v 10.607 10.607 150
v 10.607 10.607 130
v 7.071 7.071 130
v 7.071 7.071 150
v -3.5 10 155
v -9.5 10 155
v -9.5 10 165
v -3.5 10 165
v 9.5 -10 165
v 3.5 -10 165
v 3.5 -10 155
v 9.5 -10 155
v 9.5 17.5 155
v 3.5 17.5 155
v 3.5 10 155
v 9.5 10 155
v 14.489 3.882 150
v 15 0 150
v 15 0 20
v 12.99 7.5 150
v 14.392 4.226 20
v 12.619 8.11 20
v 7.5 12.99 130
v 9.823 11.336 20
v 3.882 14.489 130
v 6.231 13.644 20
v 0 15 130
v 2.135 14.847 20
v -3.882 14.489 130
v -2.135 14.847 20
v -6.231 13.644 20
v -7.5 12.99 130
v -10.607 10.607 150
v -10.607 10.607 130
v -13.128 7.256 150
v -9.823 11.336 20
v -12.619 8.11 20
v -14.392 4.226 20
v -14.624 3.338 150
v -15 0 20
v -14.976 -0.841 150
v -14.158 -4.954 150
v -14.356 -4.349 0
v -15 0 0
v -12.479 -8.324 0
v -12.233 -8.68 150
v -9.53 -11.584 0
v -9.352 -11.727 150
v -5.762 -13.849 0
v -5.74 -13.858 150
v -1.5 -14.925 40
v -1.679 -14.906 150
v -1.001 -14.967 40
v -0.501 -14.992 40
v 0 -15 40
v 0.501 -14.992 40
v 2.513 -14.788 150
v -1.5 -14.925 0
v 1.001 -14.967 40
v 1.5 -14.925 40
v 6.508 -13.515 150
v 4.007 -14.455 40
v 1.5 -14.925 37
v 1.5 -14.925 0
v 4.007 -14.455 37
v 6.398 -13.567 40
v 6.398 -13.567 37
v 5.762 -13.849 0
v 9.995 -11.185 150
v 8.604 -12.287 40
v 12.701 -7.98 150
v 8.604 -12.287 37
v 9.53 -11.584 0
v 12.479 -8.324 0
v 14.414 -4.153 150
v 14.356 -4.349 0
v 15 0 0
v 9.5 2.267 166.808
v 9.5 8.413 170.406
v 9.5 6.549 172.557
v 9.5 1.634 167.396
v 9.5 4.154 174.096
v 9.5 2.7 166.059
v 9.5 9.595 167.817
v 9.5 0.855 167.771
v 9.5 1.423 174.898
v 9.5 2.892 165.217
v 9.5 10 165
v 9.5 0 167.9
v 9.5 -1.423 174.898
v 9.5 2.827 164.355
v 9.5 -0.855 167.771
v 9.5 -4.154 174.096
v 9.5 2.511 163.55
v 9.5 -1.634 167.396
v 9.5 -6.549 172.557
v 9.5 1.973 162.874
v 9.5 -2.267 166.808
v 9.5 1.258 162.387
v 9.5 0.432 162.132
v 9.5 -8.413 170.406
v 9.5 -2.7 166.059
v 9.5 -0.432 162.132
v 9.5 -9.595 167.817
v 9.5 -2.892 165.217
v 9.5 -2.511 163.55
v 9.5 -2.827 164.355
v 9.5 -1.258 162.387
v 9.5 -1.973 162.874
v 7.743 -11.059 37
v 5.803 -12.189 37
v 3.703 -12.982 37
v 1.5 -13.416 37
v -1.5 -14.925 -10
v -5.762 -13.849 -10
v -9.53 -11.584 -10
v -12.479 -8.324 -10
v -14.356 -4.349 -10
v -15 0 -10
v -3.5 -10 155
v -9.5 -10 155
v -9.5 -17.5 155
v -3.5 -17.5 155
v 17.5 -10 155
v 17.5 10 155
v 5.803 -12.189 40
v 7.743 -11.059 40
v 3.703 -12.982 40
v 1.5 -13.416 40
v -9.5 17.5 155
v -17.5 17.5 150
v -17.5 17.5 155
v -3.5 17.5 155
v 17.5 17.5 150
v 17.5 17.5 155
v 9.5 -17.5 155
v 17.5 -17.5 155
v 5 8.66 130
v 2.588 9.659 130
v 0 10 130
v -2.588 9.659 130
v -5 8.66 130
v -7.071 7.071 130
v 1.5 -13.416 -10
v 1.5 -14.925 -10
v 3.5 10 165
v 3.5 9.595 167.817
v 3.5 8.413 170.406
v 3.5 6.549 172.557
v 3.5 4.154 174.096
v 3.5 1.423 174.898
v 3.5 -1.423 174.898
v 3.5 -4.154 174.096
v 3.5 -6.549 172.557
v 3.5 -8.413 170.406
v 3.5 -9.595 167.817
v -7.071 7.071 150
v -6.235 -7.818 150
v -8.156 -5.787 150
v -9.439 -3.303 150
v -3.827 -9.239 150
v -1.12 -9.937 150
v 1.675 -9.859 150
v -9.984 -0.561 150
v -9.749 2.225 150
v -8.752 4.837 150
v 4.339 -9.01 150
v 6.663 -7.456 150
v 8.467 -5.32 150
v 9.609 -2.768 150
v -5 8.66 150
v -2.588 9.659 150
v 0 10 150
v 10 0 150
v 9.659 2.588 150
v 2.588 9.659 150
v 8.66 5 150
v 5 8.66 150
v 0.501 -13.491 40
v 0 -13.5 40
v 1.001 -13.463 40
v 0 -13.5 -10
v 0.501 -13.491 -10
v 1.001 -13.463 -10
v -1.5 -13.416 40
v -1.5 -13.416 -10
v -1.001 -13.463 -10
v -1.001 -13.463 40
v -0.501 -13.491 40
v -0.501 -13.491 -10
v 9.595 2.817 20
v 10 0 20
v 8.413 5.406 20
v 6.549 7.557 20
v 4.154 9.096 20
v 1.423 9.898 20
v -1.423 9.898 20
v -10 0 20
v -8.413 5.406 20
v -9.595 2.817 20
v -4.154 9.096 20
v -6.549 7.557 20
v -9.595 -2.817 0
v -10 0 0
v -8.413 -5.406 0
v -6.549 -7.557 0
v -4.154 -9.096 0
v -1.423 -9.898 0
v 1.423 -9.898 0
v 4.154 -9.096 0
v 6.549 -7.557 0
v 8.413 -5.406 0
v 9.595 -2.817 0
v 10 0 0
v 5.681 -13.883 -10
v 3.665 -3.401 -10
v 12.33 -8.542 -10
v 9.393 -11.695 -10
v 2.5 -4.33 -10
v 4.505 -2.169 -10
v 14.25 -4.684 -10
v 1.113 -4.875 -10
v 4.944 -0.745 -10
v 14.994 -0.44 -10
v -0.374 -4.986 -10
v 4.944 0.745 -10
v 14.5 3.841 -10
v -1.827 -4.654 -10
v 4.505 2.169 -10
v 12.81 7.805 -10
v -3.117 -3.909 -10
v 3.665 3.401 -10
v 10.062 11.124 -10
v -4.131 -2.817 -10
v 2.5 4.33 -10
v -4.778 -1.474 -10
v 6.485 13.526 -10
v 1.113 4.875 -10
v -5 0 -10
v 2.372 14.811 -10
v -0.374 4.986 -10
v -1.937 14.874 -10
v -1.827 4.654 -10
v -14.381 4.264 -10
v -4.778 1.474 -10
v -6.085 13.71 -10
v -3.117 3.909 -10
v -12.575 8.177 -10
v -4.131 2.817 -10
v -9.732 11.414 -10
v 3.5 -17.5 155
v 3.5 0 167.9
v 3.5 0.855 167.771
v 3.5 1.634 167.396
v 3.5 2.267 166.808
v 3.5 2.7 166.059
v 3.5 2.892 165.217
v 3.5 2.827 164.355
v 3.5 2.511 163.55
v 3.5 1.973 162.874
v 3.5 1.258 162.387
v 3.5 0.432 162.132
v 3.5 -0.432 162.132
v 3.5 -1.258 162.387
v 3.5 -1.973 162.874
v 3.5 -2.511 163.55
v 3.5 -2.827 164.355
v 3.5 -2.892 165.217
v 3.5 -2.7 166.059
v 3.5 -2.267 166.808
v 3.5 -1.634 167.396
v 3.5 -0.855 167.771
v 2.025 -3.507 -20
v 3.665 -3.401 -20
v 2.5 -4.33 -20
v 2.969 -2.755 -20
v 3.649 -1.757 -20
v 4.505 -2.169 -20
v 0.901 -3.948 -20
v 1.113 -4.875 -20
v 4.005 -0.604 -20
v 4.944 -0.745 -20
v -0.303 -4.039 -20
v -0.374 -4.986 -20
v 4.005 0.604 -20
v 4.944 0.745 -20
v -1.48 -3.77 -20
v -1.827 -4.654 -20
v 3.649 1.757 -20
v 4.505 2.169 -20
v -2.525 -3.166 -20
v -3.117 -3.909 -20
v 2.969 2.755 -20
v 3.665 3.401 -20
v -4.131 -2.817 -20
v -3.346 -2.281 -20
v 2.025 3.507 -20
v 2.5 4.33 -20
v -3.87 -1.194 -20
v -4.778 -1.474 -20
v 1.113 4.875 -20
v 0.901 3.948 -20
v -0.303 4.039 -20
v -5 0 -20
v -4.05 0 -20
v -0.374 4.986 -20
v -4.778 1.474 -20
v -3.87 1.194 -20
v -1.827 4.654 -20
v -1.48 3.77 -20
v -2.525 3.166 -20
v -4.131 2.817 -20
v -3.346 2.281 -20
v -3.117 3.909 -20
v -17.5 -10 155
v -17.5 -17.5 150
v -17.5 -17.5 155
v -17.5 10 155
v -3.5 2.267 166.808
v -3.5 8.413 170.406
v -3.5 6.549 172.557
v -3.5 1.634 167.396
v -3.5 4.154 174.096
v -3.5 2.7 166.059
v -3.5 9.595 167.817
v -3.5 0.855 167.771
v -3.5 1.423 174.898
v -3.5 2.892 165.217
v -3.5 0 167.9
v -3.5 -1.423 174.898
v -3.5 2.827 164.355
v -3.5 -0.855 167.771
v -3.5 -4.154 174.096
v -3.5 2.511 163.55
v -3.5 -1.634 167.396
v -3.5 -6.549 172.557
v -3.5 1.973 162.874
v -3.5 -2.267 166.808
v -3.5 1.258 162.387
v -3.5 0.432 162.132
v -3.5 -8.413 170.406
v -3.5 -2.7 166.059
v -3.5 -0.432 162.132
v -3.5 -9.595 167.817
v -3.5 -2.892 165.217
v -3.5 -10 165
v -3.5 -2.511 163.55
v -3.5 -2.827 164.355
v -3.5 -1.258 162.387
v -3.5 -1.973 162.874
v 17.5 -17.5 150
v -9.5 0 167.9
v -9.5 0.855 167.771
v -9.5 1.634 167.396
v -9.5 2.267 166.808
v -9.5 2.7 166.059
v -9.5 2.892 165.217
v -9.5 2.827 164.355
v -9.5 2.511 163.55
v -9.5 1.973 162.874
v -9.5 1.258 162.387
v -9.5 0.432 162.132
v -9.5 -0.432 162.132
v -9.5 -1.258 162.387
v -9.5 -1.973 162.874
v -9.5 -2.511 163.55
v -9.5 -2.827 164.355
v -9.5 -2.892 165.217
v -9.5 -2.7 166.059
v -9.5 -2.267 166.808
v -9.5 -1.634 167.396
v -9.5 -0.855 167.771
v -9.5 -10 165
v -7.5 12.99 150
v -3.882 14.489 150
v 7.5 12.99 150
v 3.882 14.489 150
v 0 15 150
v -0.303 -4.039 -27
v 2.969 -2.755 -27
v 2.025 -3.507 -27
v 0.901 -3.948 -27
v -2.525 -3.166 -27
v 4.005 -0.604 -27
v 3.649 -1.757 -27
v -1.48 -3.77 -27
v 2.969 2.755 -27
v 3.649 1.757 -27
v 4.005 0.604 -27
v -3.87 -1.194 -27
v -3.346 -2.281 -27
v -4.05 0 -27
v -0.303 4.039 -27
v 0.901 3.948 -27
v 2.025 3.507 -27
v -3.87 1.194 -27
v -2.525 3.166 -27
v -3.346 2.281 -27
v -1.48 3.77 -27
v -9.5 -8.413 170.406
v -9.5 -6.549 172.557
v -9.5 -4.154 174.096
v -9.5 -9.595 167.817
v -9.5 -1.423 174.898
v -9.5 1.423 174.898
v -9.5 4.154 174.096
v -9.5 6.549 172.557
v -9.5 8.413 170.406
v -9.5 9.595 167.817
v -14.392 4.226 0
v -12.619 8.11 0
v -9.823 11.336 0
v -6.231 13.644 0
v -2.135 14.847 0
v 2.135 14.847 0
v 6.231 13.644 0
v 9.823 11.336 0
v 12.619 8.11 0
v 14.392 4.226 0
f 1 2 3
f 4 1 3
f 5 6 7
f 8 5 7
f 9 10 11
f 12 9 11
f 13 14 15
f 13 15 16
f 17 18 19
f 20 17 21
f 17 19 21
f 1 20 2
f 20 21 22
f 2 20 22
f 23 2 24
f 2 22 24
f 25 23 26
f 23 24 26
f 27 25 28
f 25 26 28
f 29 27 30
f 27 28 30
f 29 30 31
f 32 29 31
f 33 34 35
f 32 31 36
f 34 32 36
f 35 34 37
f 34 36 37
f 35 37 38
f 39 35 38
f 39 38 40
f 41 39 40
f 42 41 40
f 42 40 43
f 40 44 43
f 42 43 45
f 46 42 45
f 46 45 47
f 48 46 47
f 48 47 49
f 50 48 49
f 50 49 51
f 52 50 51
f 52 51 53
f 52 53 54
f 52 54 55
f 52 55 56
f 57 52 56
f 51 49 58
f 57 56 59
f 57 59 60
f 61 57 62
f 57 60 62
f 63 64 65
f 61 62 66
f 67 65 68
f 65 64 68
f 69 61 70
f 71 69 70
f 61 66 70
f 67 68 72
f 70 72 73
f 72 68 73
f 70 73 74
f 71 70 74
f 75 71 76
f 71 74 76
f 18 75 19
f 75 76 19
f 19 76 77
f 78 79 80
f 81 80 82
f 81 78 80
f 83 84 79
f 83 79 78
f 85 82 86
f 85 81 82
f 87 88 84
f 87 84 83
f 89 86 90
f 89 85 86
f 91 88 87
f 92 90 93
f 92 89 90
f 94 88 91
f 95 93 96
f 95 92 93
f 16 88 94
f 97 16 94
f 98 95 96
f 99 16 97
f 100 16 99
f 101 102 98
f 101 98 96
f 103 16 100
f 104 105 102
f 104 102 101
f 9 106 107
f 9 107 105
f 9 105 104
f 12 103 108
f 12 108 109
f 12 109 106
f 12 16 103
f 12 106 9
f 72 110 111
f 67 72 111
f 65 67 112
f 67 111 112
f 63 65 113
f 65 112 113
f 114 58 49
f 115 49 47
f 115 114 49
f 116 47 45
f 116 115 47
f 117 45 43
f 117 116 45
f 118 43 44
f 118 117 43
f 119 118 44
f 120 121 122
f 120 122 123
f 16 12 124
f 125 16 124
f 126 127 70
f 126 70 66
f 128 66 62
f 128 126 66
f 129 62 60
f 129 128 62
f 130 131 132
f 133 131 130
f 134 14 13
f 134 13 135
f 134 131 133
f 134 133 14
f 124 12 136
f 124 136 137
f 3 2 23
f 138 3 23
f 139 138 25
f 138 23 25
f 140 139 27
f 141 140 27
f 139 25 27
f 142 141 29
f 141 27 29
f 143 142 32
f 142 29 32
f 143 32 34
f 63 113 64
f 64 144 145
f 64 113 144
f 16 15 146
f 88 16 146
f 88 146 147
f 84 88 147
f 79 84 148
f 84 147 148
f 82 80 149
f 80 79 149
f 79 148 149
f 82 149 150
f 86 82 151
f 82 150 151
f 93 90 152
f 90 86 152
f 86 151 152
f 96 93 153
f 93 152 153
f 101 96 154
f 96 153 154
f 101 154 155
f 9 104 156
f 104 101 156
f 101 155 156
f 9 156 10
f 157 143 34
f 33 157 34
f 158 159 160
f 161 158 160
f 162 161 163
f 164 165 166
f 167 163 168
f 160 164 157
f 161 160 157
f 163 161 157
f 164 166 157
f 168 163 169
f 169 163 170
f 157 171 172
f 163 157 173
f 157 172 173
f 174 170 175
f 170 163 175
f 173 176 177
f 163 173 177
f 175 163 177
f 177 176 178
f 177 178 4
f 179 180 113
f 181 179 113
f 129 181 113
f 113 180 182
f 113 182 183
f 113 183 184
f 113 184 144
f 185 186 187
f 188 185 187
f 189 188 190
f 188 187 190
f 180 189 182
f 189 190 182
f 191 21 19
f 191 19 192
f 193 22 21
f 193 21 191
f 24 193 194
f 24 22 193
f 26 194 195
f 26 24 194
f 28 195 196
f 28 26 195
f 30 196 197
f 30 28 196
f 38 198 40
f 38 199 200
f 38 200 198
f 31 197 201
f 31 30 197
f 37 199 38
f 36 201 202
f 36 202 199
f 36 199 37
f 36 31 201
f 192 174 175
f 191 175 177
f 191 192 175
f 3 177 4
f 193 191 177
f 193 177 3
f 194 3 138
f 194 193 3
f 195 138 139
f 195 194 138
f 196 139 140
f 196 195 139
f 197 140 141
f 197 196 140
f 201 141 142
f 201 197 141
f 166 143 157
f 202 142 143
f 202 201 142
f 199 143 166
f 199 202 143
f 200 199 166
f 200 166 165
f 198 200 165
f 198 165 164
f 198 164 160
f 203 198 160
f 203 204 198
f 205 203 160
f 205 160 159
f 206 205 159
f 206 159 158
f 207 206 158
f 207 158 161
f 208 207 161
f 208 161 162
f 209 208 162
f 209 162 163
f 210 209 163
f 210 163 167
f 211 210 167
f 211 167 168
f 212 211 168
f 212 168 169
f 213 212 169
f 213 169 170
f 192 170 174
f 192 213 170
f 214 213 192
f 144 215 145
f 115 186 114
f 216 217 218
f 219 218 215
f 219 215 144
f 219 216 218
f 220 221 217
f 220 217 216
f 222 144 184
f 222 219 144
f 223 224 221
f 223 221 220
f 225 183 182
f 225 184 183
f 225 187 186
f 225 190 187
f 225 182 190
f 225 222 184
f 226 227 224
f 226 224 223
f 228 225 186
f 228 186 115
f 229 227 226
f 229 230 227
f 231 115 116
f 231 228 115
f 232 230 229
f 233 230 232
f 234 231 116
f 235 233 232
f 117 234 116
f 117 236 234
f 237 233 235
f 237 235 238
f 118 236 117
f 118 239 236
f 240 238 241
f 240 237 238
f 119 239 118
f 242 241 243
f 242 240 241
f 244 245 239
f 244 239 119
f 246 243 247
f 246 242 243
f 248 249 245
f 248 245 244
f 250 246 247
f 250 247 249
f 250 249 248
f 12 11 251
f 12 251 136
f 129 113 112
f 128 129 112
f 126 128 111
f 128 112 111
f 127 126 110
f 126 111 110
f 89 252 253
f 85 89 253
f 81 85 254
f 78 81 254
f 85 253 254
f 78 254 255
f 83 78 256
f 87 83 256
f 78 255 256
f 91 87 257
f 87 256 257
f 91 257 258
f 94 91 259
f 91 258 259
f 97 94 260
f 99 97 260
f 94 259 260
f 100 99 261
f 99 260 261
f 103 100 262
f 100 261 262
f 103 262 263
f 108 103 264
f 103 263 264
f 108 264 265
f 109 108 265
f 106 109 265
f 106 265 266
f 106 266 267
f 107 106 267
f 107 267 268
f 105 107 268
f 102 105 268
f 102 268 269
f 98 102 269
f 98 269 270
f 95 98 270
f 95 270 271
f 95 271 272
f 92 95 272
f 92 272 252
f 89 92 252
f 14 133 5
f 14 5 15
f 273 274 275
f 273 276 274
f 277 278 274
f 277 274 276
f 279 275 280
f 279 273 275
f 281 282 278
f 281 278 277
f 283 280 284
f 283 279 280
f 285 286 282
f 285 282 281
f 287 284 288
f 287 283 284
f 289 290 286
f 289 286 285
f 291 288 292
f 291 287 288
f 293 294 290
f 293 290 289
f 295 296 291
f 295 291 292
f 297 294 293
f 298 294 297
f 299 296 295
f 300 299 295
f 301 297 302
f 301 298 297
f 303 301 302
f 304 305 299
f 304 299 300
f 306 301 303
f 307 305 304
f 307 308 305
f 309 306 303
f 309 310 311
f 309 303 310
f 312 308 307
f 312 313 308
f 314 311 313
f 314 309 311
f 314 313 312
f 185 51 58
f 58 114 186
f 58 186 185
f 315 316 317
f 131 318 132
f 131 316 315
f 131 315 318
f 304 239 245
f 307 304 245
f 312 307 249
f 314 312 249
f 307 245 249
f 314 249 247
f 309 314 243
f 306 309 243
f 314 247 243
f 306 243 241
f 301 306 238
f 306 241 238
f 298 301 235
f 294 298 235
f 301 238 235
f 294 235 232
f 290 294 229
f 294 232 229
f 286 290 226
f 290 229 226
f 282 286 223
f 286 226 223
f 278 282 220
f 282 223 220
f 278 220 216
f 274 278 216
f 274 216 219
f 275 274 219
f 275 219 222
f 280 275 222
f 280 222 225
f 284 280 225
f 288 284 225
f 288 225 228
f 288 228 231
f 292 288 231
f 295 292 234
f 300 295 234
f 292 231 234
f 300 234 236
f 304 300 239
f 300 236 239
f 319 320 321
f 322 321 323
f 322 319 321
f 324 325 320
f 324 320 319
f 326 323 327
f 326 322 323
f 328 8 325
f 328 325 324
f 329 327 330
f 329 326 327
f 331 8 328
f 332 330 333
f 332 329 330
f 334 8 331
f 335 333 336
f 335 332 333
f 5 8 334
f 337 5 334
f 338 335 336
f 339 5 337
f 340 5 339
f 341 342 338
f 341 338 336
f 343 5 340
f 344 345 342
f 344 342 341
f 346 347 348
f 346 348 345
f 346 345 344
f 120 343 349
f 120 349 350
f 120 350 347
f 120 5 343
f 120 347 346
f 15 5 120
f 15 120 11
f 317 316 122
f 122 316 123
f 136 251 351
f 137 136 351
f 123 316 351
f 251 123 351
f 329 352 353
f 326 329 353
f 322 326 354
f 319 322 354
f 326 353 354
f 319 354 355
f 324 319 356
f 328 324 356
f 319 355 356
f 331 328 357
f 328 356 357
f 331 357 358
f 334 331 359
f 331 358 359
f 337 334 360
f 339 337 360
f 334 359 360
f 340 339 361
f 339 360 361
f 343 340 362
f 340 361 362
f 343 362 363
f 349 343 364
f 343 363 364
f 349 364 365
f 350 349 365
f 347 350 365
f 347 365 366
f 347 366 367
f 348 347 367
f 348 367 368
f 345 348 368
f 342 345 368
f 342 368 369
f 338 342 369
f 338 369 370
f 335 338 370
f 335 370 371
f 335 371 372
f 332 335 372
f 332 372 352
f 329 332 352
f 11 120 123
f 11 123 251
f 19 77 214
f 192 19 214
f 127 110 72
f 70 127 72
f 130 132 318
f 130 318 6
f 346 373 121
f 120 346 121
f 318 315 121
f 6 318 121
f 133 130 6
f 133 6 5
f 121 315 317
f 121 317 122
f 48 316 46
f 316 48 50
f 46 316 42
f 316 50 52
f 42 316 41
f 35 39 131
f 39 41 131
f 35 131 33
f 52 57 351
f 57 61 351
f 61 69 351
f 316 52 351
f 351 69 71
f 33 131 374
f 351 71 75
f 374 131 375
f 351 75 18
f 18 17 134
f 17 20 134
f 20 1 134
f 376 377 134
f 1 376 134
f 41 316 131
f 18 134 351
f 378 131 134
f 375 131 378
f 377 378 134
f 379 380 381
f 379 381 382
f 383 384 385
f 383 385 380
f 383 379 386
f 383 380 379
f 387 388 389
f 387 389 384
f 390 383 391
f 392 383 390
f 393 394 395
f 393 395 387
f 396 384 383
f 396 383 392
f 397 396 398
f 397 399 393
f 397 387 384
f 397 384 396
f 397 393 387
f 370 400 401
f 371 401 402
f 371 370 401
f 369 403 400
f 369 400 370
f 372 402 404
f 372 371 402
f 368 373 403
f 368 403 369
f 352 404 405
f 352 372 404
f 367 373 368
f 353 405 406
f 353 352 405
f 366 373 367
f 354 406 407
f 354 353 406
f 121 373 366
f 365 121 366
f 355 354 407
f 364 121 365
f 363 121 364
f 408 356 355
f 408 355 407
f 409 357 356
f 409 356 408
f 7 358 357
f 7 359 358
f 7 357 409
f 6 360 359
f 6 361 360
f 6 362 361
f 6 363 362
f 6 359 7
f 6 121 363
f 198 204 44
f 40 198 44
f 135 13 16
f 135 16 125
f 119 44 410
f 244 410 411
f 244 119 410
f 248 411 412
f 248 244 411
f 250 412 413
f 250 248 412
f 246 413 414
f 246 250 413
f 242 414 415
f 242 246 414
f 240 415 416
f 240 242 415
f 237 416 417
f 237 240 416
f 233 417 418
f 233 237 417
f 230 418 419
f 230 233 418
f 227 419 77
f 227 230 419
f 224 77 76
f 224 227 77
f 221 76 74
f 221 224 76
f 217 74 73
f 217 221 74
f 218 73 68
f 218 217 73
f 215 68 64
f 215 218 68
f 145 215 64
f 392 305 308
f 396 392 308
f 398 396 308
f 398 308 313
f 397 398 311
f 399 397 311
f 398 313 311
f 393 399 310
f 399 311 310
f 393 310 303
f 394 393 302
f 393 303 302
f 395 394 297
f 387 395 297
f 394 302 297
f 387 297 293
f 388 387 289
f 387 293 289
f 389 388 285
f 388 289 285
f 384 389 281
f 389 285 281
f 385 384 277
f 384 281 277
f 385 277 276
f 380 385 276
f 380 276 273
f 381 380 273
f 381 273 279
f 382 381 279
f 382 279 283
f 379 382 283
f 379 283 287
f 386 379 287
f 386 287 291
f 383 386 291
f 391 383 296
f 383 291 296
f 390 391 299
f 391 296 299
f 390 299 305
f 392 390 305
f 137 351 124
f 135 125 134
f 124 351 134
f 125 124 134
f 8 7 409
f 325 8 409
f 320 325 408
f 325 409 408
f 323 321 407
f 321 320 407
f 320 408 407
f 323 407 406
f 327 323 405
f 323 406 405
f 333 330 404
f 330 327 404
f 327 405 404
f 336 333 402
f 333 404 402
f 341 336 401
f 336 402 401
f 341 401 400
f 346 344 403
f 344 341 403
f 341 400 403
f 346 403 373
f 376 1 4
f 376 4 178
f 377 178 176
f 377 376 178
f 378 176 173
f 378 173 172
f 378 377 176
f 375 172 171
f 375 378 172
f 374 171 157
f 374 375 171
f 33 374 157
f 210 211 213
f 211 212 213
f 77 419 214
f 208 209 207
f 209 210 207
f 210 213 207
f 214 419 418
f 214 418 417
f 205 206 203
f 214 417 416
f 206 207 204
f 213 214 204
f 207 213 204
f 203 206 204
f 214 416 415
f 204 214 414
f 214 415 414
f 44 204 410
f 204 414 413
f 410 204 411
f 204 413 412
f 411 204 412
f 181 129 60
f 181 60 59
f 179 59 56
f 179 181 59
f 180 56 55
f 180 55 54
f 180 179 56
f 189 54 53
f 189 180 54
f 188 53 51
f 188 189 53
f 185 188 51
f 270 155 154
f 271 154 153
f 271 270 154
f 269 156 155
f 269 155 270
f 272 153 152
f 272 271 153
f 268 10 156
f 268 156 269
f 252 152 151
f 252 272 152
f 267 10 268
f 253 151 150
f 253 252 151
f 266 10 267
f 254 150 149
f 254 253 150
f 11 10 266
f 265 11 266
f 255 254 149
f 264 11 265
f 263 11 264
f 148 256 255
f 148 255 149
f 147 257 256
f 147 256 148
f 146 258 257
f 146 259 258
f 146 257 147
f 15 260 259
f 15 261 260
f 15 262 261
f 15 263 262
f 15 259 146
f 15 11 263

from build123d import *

# Parameters (mm, degrees)
SKETCH1_R           = 15
SKETCH1_R_2         = 10
BOSS_EXTRUDE1_DEPTH = 150
SKETCH2_W           = 35
SKETCH2_H           = 35
BOSS_EXTRUDE2_DEPTH = 5
CUT_EXTRUDE5_DEPTH  = 20
BOSS_EXTRUDE4_START = 10
SKETCH12_R          = 15
BOSS_EXTRUDE4_DEPTH = 10
SKETCH13_R          = 5
BOSS_EXTRUDE5_DEPTH = 10
CUT_EXTRUDE6_START  = 20
CUT_EXTRUDE6_DEPTH  = 20
SKETCH15_R          = 4.05
BOSS_EXTRUDE6_DEPTH = 7
SKETCH16_R          = 2.9
BOSS_EXTRUDE7_DEPTH = 35
SKETCH17_W          = 8
SKETCH17_H          = 27.5
SKETCH17_H_2        = 7.5
SKETCH17_W_2        = 7
CUT_EXTRUDE7_DEPTH  = 184.674984688
CUT_EXTRUDE11_DEPTH = 50
CUT_EXTRUDE13_START = 3
CUT_EXTRUDE13_DEPTH = 3


with BuildPart() as part:
    # Sketch1 → Boss-Extrude1 (new body)
    with BuildSketch(Plane.XY):
        Circle(SKETCH1_R)
        Circle(SKETCH1_R_2, mode=Mode.SUBTRACT)
    extrude(amount=BOSS_EXTRUDE1_DEPTH)

    # Sketch2 → Boss-Extrude2 (add)
    with BuildSketch(Plane.XY.offset(150)):
        Rectangle(SKETCH2_W, SKETCH2_H)
    extrude(amount=BOSS_EXTRUDE2_DEPTH)

    # Sketch10 → Cut-Extrude5 (cut)
    with BuildSketch(Plane(origin=(0, 0, 0), x_dir=(-1, 0, 0), z_dir=(0, 0, -1))):
        with BuildLine():
            Line((10, 0), (15, 0))
            ThreePointArc((15, 0), (0, 15), (-15, 0))
            Line((-15, 0), (-10, 0))
            ThreePointArc((-10, 0), (0, 10), (10, 0))
        make_face()
    extrude(amount=-CUT_EXTRUDE5_DEPTH, mode=Mode.SUBTRACT)

    # Sketch12 → Boss-Extrude4 (add)
    with BuildSketch(Plane(origin=(0, 0, 0), x_dir=(-1, 0, 0), z_dir=(0, 0, -1)).offset(BOSS_EXTRUDE4_START)):
        Circle(SKETCH12_R)
    extrude(amount=-BOSS_EXTRUDE4_DEPTH)

    # Sketch13 → Boss-Extrude5 (add)
    with BuildSketch(Plane(origin=(0, 0, -10), x_dir=(-1, 0, 0), z_dir=(0, 0, -1))):
        Circle(SKETCH13_R)
    extrude(amount=BOSS_EXTRUDE5_DEPTH)

    # Sketch14 → Cut-Extrude6 (cut)
    with BuildSketch(Plane(origin=(0, 0, 150), x_dir=(-1, 0, 0), z_dir=(0, 0, -1)).offset(CUT_EXTRUDE6_START)):
        with BuildLine():
            Line((-10.606601718, 10.606601718), (-7.071067812, 7.071067812))
            ThreePointArc((-7.071067812, 7.071067812), (0, 10), (7.071067812, 7.071067812))
            Line((7.071067812, 7.071067812), (10.606601718, 10.606601718))
            ThreePointArc((10.606601718, 10.606601718), (0, 15), (-10.606601718, 10.606601718))
        make_face()
    extrude(amount=-CUT_EXTRUDE6_DEPTH, mode=Mode.SUBTRACT)

    # Sketch15 → Boss-Extrude6 (add)
    with BuildSketch(Plane(origin=(0, 0, -20), x_dir=(-1, 0, 0), z_dir=(0, 0, -1))):
        Circle(SKETCH15_R)
    extrude(amount=BOSS_EXTRUDE6_DEPTH)

    # Sketch16 → Boss-Extrude7 (add)
    with BuildSketch(Plane.ZY.offset(17.5)):
        with BuildLine():
            Line((155, 10), (165, 10))
            ThreePointArc((165, 10), (175, 0), (165, -10))
            Line((165, -10), (155, -10))
            Line((155, -10), (155, 10))
        make_face()
        with Locations((165, 0)):
            Circle(SKETCH16_R, mode=Mode.SUBTRACT)
    extrude(amount=-BOSS_EXTRUDE7_DEPTH)

    # Sketch17 → Cut-Extrude7 (cut, through all)
    with BuildSketch(Plane.XY.offset(155)):
        with Locations((-13.5, -3.75)):
            Rectangle(SKETCH17_W, SKETCH17_H)
        with Locations((-13.5, 13.75)):
            Rectangle(SKETCH17_W, SKETCH17_H_2)
        with Locations((0, 13.75)):
            Rectangle(SKETCH17_W_2, SKETCH17_H_2)
        with Locations((0, -3.75)):
            Rectangle(SKETCH17_W_2, SKETCH17_H)
        with Locations((13.5, 13.75)):
            Rectangle(SKETCH17_W, SKETCH17_H_2)
        with Locations((13.5, -3.75)):
            Rectangle(SKETCH17_W, SKETCH17_H)
    extrude(amount=CUT_EXTRUDE7_DEPTH, mode=Mode.SUBTRACT)

    # Sketch20 → Cut-Extrude11 (cut)
    with BuildSketch(Plane(origin=(0, 0, -10), x_dir=(-1, 0, 0), z_dir=(0, 0, -1))):
        with BuildLine():
            ThreePointArc((1.5, -13.416407865), (0.751163705, -13.479085766), (0, -13.5))
            Line((0, -13.5), (0, -15))
            ThreePointArc((0, -15), (0.750941626, -14.981191097), (1.5, -14.924811557))
            Line((1.5, -14.924811557), (1.5, -13.416407865))
        make_face()
        with BuildLine():
            ThreePointArc((0, -13.5), (-0.751163705, -13.479085766), (-1.5, -13.416407865))
            Line((-1.5, -13.416407865), (-1.5, -14.924811557))
            ThreePointArc((-1.5, -14.924811557), (-0.750941626, -14.981191097), (0, -15))
            Line((0, -15), (0, -13.5))
        make_face()
    extrude(amount=-CUT_EXTRUDE11_DEPTH, mode=Mode.SUBTRACT)

    # Sketch23 → Cut-Extrude13 (cut)
    with BuildSketch(Plane(origin=(0, 0, 40), x_dir=(-1, 0, 0), z_dir=(0, 0, -1)).offset(CUT_EXTRUDE13_START)):
        with BuildLine():
            Line((-1.5, -14.924811557), (-1.5, -13.416407865))
            ThreePointArc((-1.5, -13.416407865), (-4.76963682, -12.629353293), (-7.743281891, -11.058552598))
            Line((-7.743281891, -11.058552598), (-8.603646545, -12.287280664))
            ThreePointArc((-8.603646545, -12.287280664), (-5.221116804, -14.062003389), (-1.5, -14.924811557))
        make_face()
    extrude(amount=-CUT_EXTRUDE13_DEPTH, mode=Mode.SUBTRACT)


solid = part.part
